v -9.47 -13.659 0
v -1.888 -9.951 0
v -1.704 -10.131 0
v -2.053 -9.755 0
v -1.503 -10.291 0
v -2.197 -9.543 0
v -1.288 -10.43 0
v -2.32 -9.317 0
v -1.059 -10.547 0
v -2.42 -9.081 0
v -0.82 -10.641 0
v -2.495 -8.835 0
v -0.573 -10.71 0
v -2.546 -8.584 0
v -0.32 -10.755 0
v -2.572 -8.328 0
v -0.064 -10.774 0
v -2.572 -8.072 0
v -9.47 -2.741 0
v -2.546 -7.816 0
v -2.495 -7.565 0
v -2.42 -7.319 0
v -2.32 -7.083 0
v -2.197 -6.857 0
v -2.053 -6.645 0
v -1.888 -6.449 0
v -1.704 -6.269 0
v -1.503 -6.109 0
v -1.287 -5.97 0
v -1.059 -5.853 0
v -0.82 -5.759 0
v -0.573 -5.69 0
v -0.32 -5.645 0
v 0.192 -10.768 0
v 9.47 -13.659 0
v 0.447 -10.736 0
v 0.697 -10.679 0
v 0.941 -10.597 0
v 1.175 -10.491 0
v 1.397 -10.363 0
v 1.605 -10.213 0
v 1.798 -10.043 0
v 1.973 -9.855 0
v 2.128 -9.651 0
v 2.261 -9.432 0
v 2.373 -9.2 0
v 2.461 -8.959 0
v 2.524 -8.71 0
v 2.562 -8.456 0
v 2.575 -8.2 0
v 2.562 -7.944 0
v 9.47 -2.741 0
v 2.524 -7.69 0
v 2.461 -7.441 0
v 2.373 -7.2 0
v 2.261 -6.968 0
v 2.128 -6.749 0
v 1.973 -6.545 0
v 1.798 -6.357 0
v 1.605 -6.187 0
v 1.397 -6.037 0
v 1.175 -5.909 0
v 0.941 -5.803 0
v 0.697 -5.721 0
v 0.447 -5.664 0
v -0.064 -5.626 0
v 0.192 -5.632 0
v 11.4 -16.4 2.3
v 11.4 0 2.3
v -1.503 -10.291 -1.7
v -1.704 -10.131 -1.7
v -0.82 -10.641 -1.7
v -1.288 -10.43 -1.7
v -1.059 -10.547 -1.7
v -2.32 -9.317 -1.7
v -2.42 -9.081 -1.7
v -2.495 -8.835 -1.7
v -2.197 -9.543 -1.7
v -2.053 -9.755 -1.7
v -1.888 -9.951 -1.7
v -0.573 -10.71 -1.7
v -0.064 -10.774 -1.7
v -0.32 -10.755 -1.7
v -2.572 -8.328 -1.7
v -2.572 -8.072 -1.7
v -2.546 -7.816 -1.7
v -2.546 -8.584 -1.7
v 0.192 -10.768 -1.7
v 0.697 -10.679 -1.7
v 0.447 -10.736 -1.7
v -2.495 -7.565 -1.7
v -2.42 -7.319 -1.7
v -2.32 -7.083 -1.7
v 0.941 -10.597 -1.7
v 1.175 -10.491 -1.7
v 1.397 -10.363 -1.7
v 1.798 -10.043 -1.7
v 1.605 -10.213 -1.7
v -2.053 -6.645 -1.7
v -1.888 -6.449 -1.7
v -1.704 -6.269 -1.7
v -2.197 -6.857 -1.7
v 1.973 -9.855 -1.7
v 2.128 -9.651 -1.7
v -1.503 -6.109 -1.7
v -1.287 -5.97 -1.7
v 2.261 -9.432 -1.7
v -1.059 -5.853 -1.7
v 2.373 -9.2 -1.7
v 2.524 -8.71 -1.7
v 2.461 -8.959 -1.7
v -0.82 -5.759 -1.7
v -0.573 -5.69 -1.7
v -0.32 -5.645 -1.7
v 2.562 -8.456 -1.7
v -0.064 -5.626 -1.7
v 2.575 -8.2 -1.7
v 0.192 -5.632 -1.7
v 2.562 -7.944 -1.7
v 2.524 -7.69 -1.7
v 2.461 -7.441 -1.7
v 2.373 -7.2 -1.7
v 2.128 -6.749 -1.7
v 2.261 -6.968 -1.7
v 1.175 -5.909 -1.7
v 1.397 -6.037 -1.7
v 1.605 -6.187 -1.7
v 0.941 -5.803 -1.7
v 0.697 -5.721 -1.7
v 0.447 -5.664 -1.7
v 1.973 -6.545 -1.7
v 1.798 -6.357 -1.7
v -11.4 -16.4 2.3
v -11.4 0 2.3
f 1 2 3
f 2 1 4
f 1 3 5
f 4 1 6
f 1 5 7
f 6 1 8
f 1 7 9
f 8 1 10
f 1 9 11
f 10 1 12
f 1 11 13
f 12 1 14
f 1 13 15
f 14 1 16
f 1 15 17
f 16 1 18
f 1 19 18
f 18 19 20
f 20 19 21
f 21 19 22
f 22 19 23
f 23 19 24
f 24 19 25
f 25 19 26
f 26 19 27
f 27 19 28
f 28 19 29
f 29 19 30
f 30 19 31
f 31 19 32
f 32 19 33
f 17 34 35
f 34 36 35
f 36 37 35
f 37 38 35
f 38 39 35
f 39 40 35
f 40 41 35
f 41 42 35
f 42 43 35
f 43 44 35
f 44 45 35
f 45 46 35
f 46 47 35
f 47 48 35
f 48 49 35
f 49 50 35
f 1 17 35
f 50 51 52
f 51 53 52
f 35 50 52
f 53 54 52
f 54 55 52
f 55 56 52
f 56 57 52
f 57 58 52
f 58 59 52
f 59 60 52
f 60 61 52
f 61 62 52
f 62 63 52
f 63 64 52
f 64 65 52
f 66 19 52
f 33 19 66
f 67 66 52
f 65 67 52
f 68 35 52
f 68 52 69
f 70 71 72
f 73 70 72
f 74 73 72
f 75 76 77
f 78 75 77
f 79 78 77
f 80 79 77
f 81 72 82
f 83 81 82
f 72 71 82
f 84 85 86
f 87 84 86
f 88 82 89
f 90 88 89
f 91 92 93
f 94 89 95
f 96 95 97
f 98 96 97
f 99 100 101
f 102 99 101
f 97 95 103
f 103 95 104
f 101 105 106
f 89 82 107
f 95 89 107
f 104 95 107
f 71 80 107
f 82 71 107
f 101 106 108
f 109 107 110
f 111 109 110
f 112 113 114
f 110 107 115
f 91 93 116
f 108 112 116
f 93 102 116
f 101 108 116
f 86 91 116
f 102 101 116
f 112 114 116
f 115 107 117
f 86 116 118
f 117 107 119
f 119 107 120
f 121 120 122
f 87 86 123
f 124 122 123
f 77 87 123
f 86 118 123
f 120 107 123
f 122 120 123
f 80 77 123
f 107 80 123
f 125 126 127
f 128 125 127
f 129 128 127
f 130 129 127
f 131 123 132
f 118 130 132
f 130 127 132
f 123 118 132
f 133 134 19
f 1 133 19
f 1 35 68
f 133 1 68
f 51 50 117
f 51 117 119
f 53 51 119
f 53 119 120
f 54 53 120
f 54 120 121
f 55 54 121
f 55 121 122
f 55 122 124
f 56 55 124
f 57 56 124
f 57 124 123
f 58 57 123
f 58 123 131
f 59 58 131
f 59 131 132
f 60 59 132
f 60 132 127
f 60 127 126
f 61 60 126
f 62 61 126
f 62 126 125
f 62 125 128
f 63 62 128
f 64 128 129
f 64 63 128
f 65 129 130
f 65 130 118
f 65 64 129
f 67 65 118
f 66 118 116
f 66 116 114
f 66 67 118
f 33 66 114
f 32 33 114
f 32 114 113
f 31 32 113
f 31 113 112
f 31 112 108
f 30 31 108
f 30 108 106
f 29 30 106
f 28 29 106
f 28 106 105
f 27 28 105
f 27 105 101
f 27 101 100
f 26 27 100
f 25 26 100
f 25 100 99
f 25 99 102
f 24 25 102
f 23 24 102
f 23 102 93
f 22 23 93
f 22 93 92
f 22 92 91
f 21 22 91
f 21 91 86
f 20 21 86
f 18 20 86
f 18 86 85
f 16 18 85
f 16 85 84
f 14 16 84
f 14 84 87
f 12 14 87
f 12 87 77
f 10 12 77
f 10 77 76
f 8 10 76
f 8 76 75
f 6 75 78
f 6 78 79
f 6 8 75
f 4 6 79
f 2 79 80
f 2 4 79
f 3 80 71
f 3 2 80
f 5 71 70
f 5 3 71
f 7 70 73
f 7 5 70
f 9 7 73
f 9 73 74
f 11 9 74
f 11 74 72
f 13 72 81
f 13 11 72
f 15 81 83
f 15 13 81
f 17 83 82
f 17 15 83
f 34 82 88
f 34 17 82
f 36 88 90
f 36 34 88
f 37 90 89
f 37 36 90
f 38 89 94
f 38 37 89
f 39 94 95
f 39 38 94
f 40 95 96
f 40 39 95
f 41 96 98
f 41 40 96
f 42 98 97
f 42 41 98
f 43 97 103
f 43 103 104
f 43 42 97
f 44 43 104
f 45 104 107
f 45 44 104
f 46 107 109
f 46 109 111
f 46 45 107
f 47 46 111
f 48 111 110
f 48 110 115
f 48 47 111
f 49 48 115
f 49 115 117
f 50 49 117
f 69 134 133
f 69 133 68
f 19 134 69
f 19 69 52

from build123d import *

# Parameters (mm, degrees)
F1_DEPTH = 16.4
F3_DEPTH = 12.5
F4_R     = 2.575
F5_DEPTH = 4


with BuildPart() as f1:
    # F0 (on Front) → F1 (new body)
    with BuildSketch(Plane.XZ):
        Polygon((-9.470071, 0), (0, 0), (9.470071, 0), (11.4, 2.3), (0, 2.3), (-11.4, 2.3), align=None)
    extrude(amount=F1_DEPTH)

    # F2 (on Right) → F3 (cut, symmetric)
    with BuildSketch(Plane.YZ):
        Polygon((-2.741004, 0), (0, 0), (0, 2.299975), align=None)
        Polygon((-13.658996, 0), (-16.4, 2.299975), (-16.4, 0), align=None)
    extrude(amount=F3_DEPTH, both=True, mode=Mode.SUBTRACT)

    # F4 (on face) → F5 (join)
    with BuildSketch(Plane.XY.offset(2.3)):
        with Locations((0, -8.2)):
            Circle(F4_R)
    extrude(amount=-F5_DEPTH)


solid = f1.part
